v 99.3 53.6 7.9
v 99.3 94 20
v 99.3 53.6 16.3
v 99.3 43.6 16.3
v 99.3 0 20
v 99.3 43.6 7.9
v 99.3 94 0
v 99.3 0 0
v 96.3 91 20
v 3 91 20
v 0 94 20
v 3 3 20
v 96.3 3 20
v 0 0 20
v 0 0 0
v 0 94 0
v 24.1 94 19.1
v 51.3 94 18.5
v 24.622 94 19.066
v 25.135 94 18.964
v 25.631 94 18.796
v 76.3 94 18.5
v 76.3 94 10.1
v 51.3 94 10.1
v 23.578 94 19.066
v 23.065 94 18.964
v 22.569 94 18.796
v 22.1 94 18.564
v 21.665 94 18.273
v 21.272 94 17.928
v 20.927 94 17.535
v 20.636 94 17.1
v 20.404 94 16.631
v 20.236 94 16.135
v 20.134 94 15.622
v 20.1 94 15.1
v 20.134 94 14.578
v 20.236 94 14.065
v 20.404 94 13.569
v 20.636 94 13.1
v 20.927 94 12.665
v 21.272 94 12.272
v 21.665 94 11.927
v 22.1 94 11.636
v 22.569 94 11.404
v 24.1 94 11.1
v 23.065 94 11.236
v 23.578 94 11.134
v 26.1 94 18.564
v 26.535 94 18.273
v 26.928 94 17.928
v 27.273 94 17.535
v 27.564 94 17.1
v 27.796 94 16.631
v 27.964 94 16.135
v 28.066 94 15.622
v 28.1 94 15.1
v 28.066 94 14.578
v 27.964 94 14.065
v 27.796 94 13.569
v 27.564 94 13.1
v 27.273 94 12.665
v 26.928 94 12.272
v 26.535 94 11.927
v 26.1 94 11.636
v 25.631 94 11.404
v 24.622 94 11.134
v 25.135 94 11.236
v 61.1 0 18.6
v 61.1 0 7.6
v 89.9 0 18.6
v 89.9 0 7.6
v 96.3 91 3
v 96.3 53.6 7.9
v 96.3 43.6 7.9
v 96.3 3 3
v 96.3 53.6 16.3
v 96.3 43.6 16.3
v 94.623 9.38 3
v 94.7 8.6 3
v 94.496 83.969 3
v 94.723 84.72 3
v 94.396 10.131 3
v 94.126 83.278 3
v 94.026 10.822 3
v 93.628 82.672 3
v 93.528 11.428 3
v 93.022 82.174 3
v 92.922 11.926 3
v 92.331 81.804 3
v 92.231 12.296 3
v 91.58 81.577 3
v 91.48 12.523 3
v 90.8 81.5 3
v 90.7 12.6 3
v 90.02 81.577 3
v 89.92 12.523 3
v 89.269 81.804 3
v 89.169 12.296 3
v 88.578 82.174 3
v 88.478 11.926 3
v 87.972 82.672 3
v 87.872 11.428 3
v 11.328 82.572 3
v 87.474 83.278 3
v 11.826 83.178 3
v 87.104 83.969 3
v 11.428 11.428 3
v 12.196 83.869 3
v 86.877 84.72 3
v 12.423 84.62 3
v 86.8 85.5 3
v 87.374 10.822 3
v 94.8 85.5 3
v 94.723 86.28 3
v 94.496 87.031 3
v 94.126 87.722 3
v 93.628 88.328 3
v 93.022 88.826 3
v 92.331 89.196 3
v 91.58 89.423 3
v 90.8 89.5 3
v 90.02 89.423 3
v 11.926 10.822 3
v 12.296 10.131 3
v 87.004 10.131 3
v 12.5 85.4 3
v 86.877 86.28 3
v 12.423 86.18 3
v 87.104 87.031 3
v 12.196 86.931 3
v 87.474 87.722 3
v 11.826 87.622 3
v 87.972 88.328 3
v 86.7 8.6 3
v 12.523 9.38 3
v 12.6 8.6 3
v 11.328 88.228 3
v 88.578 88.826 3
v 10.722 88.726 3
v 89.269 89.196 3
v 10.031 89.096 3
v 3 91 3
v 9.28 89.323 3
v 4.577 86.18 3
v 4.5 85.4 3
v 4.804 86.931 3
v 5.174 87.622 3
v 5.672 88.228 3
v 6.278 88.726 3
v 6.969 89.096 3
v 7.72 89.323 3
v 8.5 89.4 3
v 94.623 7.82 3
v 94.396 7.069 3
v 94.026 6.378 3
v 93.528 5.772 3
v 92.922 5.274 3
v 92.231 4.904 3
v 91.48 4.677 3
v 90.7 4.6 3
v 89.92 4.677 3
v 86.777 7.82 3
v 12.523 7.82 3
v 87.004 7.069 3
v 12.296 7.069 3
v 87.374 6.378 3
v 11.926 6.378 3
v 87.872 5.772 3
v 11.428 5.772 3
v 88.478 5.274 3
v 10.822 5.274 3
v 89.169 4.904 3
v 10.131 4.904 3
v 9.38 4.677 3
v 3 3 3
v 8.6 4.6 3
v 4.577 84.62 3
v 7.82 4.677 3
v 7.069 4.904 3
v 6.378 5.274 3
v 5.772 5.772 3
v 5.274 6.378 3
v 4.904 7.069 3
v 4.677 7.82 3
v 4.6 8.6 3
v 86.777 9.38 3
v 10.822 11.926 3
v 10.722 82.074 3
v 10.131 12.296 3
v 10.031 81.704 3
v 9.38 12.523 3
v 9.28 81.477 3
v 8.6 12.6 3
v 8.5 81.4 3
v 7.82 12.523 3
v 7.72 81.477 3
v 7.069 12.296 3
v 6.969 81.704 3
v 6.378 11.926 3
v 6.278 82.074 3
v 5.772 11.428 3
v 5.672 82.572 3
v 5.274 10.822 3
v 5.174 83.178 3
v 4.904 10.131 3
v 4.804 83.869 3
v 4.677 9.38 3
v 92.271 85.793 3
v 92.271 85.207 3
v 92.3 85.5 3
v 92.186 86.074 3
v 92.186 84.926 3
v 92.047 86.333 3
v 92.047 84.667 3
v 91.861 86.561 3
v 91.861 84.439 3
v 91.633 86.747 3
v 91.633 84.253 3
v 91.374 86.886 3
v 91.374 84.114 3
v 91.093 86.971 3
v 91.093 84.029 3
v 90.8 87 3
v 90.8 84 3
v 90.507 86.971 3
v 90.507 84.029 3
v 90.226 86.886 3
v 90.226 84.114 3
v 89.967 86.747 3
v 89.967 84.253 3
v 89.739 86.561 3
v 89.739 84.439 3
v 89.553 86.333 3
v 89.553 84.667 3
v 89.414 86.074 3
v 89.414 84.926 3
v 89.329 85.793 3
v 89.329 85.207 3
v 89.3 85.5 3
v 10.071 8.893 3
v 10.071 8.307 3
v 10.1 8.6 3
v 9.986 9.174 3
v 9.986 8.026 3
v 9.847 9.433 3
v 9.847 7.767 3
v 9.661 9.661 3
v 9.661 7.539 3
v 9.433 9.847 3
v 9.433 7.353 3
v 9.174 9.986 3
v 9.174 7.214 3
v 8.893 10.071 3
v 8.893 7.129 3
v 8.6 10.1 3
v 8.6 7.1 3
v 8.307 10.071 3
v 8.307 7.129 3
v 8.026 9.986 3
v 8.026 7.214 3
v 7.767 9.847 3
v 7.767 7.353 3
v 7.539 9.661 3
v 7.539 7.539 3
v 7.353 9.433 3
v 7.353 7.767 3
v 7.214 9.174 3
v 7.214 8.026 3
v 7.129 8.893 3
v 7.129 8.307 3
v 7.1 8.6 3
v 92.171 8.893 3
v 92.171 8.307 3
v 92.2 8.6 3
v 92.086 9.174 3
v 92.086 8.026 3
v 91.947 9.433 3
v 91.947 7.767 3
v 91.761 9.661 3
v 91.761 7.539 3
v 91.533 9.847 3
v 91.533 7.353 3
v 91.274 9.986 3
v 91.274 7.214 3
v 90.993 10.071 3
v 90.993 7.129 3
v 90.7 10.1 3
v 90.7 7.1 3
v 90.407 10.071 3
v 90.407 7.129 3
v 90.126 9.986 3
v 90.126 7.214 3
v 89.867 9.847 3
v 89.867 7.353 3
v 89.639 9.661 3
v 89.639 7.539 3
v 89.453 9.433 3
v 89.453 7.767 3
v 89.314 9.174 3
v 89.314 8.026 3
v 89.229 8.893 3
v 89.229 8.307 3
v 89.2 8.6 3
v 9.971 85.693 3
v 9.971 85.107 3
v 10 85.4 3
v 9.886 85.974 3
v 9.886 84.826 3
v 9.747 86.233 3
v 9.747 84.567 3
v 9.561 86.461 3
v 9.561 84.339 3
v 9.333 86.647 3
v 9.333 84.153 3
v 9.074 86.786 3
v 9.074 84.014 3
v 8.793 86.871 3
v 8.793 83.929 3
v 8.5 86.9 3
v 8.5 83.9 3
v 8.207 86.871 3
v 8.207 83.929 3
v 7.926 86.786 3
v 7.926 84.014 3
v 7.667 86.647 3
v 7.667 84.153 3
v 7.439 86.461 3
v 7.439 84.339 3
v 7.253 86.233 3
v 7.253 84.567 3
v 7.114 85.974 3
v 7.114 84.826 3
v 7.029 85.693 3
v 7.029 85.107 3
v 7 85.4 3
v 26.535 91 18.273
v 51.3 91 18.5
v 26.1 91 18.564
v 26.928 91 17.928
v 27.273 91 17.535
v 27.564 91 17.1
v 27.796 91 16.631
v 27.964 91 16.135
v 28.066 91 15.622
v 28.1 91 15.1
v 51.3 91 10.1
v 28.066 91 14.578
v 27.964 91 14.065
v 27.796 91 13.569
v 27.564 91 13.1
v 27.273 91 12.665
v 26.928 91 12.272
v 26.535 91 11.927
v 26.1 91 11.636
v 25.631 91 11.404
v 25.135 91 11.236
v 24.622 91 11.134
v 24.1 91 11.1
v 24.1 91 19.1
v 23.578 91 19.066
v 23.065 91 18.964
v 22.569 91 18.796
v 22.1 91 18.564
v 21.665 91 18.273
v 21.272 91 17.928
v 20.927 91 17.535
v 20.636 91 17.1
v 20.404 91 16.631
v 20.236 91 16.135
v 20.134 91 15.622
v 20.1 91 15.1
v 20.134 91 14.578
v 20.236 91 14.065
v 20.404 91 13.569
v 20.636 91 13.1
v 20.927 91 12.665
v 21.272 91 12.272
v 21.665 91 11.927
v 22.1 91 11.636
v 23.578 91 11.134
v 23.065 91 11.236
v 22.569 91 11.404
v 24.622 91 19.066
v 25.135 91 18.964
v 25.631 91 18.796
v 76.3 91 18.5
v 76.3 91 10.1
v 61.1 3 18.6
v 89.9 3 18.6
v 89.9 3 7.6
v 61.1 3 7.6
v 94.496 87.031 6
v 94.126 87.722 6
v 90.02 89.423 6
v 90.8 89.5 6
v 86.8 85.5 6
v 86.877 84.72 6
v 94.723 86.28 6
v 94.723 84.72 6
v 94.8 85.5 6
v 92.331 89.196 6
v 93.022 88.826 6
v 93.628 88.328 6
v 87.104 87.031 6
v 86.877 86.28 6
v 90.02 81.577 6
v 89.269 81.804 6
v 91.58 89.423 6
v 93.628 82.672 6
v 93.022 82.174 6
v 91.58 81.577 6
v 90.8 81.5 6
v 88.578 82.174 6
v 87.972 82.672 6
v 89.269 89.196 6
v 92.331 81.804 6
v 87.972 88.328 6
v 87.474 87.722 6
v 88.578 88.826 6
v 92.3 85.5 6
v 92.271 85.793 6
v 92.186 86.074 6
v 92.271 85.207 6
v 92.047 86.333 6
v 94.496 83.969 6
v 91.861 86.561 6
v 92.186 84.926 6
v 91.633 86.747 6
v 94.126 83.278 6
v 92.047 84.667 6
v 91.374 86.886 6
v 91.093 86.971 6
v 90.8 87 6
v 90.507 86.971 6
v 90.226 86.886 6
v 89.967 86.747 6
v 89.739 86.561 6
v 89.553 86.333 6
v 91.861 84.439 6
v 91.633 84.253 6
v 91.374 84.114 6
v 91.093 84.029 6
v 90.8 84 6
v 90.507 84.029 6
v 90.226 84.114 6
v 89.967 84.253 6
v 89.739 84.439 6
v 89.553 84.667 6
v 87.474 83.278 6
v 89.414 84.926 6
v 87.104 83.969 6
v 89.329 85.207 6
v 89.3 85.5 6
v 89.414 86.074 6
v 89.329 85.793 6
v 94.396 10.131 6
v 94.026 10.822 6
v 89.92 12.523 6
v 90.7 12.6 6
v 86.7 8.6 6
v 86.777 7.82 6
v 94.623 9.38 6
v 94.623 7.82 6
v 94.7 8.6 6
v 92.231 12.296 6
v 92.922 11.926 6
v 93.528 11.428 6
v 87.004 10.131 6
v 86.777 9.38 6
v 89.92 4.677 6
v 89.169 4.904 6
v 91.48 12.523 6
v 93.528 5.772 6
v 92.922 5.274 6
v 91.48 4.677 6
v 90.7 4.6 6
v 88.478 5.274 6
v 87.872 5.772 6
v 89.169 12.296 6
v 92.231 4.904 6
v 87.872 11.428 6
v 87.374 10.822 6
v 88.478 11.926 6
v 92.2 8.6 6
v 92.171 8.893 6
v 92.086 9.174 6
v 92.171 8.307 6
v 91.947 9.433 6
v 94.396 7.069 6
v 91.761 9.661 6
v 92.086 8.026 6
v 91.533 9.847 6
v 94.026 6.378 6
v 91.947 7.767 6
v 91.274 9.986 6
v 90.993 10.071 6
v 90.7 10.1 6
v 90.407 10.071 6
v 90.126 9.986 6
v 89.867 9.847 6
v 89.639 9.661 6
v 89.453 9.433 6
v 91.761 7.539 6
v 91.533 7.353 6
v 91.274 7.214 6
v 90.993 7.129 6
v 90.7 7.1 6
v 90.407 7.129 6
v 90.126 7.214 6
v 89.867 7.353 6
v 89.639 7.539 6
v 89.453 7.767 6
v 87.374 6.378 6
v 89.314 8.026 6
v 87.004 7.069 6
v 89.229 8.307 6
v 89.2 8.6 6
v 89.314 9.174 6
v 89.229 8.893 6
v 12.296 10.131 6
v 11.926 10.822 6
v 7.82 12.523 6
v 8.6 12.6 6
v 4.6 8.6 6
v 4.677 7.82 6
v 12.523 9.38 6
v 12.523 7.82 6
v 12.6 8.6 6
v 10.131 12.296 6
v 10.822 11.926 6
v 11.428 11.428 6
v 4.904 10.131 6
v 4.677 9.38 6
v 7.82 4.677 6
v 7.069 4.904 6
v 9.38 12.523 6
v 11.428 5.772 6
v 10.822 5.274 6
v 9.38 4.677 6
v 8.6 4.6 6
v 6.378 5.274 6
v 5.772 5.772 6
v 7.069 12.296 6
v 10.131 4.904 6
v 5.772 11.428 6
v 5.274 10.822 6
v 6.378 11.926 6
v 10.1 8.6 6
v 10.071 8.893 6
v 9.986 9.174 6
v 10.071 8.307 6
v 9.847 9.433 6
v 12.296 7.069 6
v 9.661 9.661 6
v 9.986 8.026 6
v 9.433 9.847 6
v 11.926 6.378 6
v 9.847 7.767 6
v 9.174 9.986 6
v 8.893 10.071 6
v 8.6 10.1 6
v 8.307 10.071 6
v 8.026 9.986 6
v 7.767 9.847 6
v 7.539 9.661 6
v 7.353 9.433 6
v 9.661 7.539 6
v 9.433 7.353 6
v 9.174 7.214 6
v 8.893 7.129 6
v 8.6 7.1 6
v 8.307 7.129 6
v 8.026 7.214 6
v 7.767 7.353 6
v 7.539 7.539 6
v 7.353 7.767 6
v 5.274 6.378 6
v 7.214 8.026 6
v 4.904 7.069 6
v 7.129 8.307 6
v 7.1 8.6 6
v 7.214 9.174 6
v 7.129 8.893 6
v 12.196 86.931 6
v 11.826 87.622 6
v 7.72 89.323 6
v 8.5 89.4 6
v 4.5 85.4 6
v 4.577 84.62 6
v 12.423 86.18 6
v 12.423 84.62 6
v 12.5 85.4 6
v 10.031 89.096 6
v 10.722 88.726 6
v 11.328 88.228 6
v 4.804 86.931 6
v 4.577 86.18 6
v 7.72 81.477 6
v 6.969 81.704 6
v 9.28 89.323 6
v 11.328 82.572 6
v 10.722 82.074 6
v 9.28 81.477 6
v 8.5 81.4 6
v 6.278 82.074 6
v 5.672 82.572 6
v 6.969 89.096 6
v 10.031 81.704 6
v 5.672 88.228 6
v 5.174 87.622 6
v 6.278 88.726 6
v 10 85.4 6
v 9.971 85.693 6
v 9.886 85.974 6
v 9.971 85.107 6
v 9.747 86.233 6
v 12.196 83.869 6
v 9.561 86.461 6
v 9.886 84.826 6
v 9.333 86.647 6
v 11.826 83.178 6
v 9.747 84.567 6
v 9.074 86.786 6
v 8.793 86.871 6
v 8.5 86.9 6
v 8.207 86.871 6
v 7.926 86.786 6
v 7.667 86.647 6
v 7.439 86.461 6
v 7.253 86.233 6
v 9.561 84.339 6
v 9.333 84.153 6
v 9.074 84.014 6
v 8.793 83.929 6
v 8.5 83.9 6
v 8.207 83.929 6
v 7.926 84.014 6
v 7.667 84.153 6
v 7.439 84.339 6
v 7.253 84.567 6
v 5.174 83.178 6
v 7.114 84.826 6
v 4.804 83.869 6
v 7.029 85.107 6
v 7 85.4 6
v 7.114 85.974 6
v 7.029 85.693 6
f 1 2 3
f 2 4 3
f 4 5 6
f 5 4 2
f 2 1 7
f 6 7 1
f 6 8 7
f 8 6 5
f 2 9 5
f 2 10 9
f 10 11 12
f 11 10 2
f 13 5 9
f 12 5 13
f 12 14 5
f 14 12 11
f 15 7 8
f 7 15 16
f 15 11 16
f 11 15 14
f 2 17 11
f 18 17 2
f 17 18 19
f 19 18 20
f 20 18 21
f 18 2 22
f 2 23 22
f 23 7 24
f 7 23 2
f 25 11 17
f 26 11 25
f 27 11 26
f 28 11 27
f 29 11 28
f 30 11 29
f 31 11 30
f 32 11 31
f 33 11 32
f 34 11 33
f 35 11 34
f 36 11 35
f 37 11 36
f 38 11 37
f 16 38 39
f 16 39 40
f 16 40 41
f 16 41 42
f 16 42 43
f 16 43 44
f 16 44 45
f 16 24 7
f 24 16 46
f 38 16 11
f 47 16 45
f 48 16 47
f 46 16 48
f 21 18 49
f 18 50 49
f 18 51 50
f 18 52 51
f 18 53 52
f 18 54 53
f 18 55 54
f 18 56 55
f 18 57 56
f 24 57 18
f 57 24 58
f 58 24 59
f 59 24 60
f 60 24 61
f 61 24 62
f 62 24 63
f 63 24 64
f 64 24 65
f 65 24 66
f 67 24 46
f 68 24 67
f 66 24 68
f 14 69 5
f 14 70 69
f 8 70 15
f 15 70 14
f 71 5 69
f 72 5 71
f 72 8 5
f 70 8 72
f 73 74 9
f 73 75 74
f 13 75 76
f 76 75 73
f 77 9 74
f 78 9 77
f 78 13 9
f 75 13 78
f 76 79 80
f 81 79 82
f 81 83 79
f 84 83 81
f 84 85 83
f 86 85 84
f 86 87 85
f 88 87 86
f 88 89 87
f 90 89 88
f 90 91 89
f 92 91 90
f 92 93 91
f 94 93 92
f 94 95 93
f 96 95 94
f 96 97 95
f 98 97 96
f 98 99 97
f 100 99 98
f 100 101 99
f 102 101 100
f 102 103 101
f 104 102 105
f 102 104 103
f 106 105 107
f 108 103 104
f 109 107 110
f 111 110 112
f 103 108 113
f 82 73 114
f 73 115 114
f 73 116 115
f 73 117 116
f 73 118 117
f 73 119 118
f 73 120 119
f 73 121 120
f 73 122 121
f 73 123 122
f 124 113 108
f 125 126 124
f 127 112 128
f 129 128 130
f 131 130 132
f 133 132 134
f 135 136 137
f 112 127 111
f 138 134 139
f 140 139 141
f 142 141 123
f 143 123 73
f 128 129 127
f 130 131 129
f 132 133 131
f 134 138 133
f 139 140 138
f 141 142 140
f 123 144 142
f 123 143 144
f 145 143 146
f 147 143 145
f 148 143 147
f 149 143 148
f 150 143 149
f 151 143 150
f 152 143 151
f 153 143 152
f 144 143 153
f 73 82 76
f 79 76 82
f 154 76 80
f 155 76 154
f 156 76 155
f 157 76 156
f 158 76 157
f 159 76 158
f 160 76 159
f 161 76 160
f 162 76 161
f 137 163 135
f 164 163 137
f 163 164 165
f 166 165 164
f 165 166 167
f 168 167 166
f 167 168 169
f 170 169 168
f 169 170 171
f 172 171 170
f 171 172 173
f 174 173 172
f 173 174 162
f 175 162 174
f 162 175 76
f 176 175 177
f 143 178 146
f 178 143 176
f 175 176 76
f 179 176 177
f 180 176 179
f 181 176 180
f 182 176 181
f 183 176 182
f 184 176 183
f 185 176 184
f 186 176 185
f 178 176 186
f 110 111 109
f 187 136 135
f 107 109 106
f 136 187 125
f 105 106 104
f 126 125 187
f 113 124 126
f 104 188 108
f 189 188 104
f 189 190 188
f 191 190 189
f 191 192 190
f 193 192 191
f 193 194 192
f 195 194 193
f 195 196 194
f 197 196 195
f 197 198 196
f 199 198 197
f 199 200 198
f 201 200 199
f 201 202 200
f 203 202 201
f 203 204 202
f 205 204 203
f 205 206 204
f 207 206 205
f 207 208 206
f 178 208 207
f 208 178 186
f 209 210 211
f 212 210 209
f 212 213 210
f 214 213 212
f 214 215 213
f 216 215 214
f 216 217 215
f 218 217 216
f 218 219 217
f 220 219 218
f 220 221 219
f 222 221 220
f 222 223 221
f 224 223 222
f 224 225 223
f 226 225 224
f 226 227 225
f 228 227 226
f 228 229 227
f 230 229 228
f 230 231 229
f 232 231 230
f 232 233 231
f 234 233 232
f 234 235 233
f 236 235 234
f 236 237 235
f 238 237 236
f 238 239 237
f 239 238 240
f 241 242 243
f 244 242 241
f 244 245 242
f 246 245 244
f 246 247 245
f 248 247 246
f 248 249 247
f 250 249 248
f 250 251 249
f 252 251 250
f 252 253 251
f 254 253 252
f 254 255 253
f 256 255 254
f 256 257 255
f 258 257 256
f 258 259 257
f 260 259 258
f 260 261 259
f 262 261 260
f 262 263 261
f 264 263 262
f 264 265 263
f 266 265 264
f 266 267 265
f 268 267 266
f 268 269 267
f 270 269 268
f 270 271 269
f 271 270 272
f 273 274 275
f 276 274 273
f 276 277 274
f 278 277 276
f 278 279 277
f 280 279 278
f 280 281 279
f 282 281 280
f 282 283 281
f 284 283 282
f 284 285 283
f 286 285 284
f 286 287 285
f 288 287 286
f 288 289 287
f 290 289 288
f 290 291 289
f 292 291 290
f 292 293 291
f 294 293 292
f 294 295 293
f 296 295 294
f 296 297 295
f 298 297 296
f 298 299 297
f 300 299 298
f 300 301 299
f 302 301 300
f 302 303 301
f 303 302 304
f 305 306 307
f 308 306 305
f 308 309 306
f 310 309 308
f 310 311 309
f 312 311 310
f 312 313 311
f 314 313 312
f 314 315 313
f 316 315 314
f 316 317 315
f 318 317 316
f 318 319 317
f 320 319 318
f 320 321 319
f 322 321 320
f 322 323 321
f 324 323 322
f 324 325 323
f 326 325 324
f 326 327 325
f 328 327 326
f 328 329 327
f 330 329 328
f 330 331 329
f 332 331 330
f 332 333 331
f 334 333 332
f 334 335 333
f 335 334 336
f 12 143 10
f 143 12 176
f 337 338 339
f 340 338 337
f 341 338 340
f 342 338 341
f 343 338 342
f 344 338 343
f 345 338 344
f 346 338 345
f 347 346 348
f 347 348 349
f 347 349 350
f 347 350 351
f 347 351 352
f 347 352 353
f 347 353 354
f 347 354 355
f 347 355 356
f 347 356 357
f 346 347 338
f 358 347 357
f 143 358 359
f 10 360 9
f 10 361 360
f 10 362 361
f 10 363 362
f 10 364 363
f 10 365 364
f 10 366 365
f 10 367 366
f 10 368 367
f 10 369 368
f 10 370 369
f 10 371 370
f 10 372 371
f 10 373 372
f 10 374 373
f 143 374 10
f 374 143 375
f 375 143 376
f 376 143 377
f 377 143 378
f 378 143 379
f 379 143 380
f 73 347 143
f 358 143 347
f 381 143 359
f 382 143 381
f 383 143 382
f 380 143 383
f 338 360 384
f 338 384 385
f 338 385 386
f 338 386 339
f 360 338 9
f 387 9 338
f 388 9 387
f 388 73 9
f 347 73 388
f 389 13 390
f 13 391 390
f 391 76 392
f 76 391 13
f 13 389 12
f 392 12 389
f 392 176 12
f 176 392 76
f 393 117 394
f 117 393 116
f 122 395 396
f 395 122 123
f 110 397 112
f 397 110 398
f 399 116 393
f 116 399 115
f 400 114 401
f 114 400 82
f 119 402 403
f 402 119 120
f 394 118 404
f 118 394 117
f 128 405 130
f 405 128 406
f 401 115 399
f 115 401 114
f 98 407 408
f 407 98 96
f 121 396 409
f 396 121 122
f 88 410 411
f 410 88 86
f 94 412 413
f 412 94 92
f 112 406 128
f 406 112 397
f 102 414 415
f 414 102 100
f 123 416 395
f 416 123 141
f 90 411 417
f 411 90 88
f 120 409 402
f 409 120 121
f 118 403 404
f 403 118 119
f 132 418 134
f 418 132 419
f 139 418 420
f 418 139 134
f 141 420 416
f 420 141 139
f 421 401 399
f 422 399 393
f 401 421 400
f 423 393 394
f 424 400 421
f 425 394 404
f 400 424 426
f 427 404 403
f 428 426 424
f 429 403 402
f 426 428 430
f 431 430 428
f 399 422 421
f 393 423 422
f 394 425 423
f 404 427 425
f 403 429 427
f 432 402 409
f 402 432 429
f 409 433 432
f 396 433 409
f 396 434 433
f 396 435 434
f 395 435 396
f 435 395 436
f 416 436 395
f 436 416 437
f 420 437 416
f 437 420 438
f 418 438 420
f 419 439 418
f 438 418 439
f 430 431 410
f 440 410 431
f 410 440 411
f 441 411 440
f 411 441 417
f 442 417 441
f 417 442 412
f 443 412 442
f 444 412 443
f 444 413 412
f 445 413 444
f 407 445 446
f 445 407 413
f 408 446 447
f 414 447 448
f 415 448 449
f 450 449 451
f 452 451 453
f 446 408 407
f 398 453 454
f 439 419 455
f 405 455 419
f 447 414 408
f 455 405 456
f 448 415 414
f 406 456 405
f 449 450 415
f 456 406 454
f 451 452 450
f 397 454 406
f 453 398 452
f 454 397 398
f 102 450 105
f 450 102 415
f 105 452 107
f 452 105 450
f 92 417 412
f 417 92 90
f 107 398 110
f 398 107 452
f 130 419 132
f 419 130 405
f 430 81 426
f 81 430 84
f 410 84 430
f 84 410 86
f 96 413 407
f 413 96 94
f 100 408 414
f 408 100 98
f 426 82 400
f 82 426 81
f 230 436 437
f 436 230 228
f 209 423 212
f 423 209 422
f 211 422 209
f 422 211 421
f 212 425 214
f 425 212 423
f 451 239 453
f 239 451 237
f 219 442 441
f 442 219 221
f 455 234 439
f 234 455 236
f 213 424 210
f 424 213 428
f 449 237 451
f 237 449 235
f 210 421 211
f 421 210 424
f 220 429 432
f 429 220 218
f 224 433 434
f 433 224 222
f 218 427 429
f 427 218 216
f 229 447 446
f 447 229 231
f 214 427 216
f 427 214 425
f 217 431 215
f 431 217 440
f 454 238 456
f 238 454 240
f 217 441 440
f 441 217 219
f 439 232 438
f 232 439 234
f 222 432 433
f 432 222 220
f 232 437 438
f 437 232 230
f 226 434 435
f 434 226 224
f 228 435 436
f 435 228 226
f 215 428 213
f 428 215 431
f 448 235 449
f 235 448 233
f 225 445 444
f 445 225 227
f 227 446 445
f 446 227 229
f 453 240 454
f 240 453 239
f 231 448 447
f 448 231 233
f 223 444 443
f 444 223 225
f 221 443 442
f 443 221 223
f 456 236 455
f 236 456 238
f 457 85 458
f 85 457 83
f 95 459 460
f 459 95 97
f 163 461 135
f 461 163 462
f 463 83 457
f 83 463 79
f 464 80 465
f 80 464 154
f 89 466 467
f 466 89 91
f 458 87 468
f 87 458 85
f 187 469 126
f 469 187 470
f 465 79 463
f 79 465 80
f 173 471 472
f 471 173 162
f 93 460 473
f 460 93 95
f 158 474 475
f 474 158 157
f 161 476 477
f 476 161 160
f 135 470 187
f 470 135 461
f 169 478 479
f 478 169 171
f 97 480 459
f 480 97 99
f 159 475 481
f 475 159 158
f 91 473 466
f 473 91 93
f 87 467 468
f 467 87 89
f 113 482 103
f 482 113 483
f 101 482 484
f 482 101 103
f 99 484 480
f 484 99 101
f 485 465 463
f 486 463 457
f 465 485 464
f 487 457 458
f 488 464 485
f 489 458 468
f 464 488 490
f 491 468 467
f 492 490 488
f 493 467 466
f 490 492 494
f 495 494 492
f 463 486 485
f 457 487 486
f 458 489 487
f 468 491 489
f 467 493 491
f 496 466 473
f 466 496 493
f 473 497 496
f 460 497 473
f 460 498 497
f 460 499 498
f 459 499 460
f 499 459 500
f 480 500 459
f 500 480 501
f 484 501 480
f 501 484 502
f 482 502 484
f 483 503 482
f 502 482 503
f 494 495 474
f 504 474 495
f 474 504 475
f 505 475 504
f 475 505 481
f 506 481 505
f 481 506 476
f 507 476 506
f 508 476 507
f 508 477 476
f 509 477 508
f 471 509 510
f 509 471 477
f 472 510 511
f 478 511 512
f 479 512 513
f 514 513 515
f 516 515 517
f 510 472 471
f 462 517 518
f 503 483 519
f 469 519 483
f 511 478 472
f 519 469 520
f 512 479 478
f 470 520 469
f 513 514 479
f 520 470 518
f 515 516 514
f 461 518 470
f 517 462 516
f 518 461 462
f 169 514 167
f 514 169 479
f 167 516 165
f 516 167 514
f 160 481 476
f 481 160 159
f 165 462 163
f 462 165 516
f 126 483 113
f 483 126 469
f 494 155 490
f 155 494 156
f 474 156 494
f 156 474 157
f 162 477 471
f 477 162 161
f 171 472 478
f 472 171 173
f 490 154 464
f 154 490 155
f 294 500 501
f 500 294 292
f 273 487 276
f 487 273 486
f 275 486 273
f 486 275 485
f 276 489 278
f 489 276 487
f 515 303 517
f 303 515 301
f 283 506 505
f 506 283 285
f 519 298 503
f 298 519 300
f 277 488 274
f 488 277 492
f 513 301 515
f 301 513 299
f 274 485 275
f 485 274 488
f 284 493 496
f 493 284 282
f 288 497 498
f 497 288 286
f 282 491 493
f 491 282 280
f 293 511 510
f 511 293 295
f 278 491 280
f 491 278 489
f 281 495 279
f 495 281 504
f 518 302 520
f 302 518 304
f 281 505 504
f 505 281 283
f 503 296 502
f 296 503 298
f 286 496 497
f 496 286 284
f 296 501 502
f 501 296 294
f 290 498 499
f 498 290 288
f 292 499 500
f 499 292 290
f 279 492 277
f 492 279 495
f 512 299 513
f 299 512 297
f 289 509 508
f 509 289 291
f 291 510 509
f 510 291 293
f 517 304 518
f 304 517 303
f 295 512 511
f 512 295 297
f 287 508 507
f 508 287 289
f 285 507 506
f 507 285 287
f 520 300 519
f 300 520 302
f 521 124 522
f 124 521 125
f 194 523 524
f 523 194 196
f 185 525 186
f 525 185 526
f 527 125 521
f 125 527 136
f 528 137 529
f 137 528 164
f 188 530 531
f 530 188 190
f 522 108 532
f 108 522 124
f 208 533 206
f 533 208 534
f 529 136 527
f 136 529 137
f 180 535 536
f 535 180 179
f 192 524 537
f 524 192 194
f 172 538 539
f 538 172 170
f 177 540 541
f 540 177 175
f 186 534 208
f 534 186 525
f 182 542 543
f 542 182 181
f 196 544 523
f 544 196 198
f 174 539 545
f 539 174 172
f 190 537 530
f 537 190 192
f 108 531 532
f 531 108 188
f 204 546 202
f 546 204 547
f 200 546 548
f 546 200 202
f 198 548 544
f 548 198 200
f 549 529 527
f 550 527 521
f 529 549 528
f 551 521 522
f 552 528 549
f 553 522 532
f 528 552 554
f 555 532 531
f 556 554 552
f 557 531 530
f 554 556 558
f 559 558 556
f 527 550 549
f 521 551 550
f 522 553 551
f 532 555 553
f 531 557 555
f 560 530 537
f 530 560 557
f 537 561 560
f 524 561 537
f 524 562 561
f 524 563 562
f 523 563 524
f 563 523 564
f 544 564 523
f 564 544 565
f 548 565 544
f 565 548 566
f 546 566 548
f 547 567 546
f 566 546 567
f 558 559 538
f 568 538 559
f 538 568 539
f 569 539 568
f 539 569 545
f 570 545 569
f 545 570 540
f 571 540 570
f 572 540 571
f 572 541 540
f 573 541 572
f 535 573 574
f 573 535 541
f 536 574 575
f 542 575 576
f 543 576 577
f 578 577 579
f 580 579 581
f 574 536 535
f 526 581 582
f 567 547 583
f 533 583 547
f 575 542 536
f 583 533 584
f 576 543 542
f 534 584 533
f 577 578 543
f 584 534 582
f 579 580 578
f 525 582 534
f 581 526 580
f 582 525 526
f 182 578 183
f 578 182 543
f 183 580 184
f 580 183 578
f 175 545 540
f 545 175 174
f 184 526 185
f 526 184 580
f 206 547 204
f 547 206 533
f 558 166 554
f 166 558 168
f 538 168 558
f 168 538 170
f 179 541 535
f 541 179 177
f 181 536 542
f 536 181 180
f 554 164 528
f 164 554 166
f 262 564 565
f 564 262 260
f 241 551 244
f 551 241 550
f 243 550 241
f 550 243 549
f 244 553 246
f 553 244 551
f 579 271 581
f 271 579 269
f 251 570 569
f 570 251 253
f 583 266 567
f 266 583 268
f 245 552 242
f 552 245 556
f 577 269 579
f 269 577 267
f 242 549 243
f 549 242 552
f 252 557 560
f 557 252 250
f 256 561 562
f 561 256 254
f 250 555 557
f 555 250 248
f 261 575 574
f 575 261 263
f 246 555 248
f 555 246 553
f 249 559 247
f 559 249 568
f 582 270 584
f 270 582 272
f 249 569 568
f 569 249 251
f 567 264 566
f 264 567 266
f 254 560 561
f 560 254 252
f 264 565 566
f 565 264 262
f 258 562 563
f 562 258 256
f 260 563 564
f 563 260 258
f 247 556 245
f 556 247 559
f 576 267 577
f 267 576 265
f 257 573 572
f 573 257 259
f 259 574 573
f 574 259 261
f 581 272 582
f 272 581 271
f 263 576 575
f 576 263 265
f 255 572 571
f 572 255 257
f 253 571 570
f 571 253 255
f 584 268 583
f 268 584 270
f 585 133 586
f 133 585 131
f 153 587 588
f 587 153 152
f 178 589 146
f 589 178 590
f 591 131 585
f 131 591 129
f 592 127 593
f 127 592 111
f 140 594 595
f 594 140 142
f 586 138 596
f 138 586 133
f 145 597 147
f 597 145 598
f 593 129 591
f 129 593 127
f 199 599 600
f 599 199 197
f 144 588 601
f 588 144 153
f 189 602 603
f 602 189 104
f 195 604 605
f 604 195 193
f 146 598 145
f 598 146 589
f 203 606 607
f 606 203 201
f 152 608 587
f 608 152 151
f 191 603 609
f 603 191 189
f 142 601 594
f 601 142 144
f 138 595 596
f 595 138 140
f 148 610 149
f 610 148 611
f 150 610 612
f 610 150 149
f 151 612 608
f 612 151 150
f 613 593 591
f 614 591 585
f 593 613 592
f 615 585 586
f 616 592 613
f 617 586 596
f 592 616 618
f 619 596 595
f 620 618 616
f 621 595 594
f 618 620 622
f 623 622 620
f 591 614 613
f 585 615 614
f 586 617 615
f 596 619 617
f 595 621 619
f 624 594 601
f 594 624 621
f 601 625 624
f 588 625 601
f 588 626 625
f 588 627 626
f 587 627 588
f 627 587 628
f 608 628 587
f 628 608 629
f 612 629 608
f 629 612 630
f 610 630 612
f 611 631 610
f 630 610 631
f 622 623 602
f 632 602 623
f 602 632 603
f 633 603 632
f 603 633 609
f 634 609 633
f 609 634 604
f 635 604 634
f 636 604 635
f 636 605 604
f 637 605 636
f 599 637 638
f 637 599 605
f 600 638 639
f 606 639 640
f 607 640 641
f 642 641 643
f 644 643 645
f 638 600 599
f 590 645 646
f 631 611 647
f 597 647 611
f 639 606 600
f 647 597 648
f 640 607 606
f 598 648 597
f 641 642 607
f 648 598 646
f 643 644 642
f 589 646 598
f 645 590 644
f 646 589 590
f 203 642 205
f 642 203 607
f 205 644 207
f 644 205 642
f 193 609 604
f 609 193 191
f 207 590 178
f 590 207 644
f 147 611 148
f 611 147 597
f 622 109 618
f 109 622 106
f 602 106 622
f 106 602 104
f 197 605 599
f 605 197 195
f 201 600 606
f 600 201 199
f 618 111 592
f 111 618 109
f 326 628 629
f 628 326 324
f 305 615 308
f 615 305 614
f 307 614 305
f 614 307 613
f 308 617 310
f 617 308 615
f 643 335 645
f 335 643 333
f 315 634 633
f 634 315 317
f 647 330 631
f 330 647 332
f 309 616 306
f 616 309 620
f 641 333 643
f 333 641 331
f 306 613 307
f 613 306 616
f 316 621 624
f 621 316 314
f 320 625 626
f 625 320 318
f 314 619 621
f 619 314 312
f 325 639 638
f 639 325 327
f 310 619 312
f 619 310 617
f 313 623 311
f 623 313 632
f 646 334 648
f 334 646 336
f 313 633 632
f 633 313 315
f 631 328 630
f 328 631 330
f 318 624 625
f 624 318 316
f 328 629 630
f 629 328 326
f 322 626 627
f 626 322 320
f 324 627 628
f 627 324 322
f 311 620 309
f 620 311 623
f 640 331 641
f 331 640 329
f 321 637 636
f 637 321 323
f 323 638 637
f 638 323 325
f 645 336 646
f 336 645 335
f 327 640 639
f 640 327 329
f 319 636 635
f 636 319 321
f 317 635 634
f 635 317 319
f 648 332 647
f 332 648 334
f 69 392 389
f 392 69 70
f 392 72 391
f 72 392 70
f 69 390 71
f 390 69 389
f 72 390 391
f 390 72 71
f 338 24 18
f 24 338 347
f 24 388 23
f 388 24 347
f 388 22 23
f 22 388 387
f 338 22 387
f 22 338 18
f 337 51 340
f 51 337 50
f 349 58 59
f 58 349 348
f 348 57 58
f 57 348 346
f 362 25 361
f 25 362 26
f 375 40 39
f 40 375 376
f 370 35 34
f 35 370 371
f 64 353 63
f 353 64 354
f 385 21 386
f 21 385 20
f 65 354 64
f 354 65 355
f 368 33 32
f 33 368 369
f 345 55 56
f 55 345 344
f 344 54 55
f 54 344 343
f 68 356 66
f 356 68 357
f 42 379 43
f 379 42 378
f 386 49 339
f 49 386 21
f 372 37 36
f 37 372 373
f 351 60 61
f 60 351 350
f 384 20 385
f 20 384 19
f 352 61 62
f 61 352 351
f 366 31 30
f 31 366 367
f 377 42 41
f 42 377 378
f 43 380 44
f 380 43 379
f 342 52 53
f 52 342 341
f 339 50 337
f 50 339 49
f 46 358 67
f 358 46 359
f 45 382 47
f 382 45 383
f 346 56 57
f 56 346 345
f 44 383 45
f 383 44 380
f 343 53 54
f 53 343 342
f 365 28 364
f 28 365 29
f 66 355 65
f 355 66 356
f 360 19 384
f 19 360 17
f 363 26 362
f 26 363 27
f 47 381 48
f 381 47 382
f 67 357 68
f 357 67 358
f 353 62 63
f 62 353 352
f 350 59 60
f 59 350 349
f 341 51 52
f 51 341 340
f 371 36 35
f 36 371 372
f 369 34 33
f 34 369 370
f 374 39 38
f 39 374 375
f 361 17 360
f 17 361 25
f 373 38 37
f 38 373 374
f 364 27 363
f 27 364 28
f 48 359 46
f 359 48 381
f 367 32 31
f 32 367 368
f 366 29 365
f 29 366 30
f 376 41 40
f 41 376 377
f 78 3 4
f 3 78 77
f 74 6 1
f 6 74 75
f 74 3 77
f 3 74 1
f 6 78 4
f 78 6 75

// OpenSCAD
// ============================================================
// Gabinete - ModemEYSE4G_LTE_Cat1_simA7670SA - BASE
// Pieza separada: solo la base (paredes + piso + parantes de
// montaje + calados de conectores laterales). La tapa esta en
// el archivo gabinete_ModemEYSE4G_tapa_6.scad
// Sistema de coordenadas: origen en la esquina inferior
// izquierda de la placa (0,0), igual que se referencia en
// la conversacion de diseno.
// ============================================================

// ---------- PARAMETROS DE LA PLACA ----------
board_x = 90.3;         // ancho de la placa (mm)
board_y = 85.0;         // alto de la placa (mm)
board_thickness = 1.6;  // espesor del PCB (mm)

// ---------- PARAMETROS DEL GABINETE ----------
wall = 3.0;             // espesor de pared, hacia afuera (mm) - definido por Damian
floor_thickness = 3.0;  // espesor del piso - ASUNCION: igual al espesor de pared,
                        // confirmar con Damian si debe ser distinto
box_ext_height = 20.0;  // altura EXTERIOR de la caja (sin contar la tapa) - definido por Damian
clearance_xy = 1.5;     // holgura alrededor de la placa (mm)

// La placa se apoya con la cara de componentes hacia ARRIBA (+Z), sujeta
// por tornillos insertados desde arriba en H1-H4 hacia parantes que
// suben desde el piso del gabinete. La cara inferior de la placa NO
// tiene componentes (es la cara "back"), asi que este hueco es solo
// la altura estructural del parante, no un espacio para alojar partes.
floor_to_board = 3;

// Referencia de altura "piso del PCB" (superficie superior, donde
// asientan los componentes) usada para todos los calados de conectores,
// tal como la definio Damian: piso del gabinete (Z=0) + pared (3mm)
// + teton (floor_to_board) + espesor de PCB (1.6mm).
pcb_top_z = floor_thickness + floor_to_board + board_thickness; // = 7.6mm

// ---------- ESPEJADO EN X ----------
// La placa se coloca con la cara de componentes hacia arriba (+Z),
// pero al hacerlo, el eje X queda invertido respecto a como KiCad
// lo guarda en el archivo (que siempre referencia la vista desde
// arriba mirando el F.Cu tal cual se dibuja en el editor). Por eso
// TODAS las coordenadas X de conectores/holes/LEDs se espejan con
// esta funcion antes de usarse. Las coordenadas "_kicad" que siguen
// abajo son las crudas, tal cual figuran en el .kicad_pcb - no las
// toques a mano, se recalculan solas via mirror_x().
mirror_x = true;
function mx(x) = mirror_x ? (board_x - x) : x;

// ---------- MOUNTING HOLES ----------
// Coordenadas crudas de KiCad (relativas a 0,0 de la placa):
// H1: esquina inferior izquierda, H2: superior izquierda,
// H3: superior derecha, H4: inferior derecha
mount_holes_kicad = [
    [4.0, 81.0],   // H1
    [4.1, 4.1],    // H2
    [86.2, 4.1],   // H3
    [86.3, 80.9]   // H4
];
mount_holes = [ for (p = mount_holes_kicad) [mx(p[0]), p[1]] ];
mount_hole_d = 4.0;     // diametro del taladro NPTH (confirmado en drill file)
standoff_od = 8.0;      // diametro externo del standoff/boss - AJUSTAR a gusto
screw_d = 3.0;          // diametro de tornillo autorroscante - CONFIRMAR con Damian

// ---------- CONECTORES ----------
// Coordenadas X crudas de KiCad, ya pasadas por mx() abajo.
// Cada conector tiene su propia altura de calado en Z, medida desde
// pcb_top_z segun lo definido con Damian.

// J1 y J5 (alimentacion): calado rectangular 20mm ancho, 11mm alto
// (reducido desde 15mm para entrar en la caja de 20mm).
conn_J1J5_w = 20;
conn_J1J5_h = 11;
conn_J1J5_z = pcb_top_z + conn_J1J5_h/2; // = 13.1mm

conn_J1_terminal = [mx(23.7), conn_J1J5_w, conn_J1J5_h]; // pared trasera (y=0)
conn_J5_barrel   = [mx(14.9), conn_J1J5_w, conn_J1J5_h]; // pared trasera (y=0)

// J4 (SMA): agujero circular de 8mm de diametro, centrado a 7.5mm
// sobre el piso del PCB (dato dado por Damian).
conn_J4_sma_d = 8;
conn_J4_sma_x = mx(70.7);           // pared frontal (y=board_y)
conn_J4_sma_z = pcb_top_z + 7.5;    // = 15.1mm

// J2 (DB9 hembra a 90 grados): calado rectangular. Arranca a 2.5mm
// sobre el piso del PCB y sube 8.4mm (el maximo que entra sin agrandar
// la caja, confirmado por Damian). Ancho tomado de la separacion entre
// tornillos propios del conector (25mm) - ASUNCION, confirmar que el
// ancho real de la carcasa no sea mayor a eso.
conn_J2_w = 25;
conn_J2_h = 8.4;
conn_J2_z_start = pcb_top_z + 2.5;
conn_J2_z = conn_J2_z_start + conn_J2_h/2; // = 14.3mm
conn_J2_db9 = [mx(31.0), conn_J2_w, conn_J2_h]; // pared frontal (y=board_y)

// USB-C de U5 (Black Pill): pared derecha, a 44.1mm a lo largo del eje Y.
// OJO: tal como esta este bloque (igual al archivo subido), el calado
// real en el modulo mas abajo usa conn_J2_db9[2] (8.4mm, la altura de
// J2) en vez de conn_J1J5_h (11mm) - quedo pendiente de esa correccion,
// que se discutio en el mensaje anterior y todavia no se aplico aca.
conn_usbc_w = 10;
conn_usbc_h = 5; // valor sin usar actualmente por el bug mencionado arriba
conn_usbc_z = pcb_top_z + 7.5;
conn_usbc_y = 44.1; // a lo largo de la pared derecha (coordenada Y real, no se espeja)

// J3 (U.FL) es interno, no necesita corte en el gabinete.

// ============================================================
// MODULOS
// ============================================================

module mounting_boss(h) {
    difference() {
        cylinder(h = h, d = standoff_od, $fn = 32);
        cylinder(h = h + 1, d = screw_d, $fn = 32);
    }
}

// Dimensiones exteriores totales de la caja
outer_x = board_x + 2 * (wall + clearance_xy);
outer_y = board_y + 2 * (wall + clearance_xy);
offset_x = wall + clearance_xy; // offset del (0,0) de la placa dentro de la caja
offset_y = wall + clearance_xy;

module base_gabinete() {
    difference() {
        union() {
            // Cascaron exterior (piso + paredes), altura EXTERIOR fija = box_ext_height
            difference() {
                cube([outer_x, outer_y, box_ext_height]);
                translate([wall, wall, floor_thickness])
                    cube([outer_x - 2*wall, outer_y - 2*wall,
                          box_ext_height - floor_thickness + 1]);
            }
            // Bosses de montaje, en coordenadas reales de H1-H4
            for (p = mount_holes) {
                translate([p[0] + offset_x, p[1] + offset_y, floor_thickness])
                    mounting_boss(floor_to_board);
            }
        }

        // ---- Calados laterales ----
        // Pared trasera (y=0): J1 y J5
        translate([conn_J1_terminal[0] + offset_x, -1, conn_J1J5_z])
            rotate([-90,0,0])
            linear_extrude(height = wall + 2)
            square([conn_J1_terminal[1], conn_J1_terminal[2]], center = true);

        translate([conn_J5_barrel[0] + offset_x, -1, conn_J1J5_z])
            rotate([-90,0,0])
            linear_extrude(height = wall + 2)
            square([conn_J5_barrel[1], conn_J5_barrel[2]], center = true);

        // Pared frontal (y=outer_y): J2 y J4
        translate([conn_J2_db9[0] + offset_x, outer_y - wall - 1, conn_J2_z])
            rotate([-90,0,0])
            linear_extrude(height = wall + 2)
            square([conn_J2_db9[1], conn_J2_db9[2]], center = true);

        translate([conn_J4_sma_x + offset_x, outer_y - wall - 1, conn_J4_sma_z])
            rotate([-90,0,0])
            cylinder(h = wall + 2, d = conn_J4_sma_d, $fn = 48);

        // USB-C de U5: pared derecha (x = outer_x), a lo largo del eje Y.
        translate([
            outer_x - wall - 1, conn_usbc_y + offset_y - conn_usbc_w/2,
            conn_usbc_z - conn_J2_db9[2]/2 - 3 ])
        cube([wall + 2, conn_usbc_w, conn_J2_db9[2]]);
    }
}

base_gabinete();
